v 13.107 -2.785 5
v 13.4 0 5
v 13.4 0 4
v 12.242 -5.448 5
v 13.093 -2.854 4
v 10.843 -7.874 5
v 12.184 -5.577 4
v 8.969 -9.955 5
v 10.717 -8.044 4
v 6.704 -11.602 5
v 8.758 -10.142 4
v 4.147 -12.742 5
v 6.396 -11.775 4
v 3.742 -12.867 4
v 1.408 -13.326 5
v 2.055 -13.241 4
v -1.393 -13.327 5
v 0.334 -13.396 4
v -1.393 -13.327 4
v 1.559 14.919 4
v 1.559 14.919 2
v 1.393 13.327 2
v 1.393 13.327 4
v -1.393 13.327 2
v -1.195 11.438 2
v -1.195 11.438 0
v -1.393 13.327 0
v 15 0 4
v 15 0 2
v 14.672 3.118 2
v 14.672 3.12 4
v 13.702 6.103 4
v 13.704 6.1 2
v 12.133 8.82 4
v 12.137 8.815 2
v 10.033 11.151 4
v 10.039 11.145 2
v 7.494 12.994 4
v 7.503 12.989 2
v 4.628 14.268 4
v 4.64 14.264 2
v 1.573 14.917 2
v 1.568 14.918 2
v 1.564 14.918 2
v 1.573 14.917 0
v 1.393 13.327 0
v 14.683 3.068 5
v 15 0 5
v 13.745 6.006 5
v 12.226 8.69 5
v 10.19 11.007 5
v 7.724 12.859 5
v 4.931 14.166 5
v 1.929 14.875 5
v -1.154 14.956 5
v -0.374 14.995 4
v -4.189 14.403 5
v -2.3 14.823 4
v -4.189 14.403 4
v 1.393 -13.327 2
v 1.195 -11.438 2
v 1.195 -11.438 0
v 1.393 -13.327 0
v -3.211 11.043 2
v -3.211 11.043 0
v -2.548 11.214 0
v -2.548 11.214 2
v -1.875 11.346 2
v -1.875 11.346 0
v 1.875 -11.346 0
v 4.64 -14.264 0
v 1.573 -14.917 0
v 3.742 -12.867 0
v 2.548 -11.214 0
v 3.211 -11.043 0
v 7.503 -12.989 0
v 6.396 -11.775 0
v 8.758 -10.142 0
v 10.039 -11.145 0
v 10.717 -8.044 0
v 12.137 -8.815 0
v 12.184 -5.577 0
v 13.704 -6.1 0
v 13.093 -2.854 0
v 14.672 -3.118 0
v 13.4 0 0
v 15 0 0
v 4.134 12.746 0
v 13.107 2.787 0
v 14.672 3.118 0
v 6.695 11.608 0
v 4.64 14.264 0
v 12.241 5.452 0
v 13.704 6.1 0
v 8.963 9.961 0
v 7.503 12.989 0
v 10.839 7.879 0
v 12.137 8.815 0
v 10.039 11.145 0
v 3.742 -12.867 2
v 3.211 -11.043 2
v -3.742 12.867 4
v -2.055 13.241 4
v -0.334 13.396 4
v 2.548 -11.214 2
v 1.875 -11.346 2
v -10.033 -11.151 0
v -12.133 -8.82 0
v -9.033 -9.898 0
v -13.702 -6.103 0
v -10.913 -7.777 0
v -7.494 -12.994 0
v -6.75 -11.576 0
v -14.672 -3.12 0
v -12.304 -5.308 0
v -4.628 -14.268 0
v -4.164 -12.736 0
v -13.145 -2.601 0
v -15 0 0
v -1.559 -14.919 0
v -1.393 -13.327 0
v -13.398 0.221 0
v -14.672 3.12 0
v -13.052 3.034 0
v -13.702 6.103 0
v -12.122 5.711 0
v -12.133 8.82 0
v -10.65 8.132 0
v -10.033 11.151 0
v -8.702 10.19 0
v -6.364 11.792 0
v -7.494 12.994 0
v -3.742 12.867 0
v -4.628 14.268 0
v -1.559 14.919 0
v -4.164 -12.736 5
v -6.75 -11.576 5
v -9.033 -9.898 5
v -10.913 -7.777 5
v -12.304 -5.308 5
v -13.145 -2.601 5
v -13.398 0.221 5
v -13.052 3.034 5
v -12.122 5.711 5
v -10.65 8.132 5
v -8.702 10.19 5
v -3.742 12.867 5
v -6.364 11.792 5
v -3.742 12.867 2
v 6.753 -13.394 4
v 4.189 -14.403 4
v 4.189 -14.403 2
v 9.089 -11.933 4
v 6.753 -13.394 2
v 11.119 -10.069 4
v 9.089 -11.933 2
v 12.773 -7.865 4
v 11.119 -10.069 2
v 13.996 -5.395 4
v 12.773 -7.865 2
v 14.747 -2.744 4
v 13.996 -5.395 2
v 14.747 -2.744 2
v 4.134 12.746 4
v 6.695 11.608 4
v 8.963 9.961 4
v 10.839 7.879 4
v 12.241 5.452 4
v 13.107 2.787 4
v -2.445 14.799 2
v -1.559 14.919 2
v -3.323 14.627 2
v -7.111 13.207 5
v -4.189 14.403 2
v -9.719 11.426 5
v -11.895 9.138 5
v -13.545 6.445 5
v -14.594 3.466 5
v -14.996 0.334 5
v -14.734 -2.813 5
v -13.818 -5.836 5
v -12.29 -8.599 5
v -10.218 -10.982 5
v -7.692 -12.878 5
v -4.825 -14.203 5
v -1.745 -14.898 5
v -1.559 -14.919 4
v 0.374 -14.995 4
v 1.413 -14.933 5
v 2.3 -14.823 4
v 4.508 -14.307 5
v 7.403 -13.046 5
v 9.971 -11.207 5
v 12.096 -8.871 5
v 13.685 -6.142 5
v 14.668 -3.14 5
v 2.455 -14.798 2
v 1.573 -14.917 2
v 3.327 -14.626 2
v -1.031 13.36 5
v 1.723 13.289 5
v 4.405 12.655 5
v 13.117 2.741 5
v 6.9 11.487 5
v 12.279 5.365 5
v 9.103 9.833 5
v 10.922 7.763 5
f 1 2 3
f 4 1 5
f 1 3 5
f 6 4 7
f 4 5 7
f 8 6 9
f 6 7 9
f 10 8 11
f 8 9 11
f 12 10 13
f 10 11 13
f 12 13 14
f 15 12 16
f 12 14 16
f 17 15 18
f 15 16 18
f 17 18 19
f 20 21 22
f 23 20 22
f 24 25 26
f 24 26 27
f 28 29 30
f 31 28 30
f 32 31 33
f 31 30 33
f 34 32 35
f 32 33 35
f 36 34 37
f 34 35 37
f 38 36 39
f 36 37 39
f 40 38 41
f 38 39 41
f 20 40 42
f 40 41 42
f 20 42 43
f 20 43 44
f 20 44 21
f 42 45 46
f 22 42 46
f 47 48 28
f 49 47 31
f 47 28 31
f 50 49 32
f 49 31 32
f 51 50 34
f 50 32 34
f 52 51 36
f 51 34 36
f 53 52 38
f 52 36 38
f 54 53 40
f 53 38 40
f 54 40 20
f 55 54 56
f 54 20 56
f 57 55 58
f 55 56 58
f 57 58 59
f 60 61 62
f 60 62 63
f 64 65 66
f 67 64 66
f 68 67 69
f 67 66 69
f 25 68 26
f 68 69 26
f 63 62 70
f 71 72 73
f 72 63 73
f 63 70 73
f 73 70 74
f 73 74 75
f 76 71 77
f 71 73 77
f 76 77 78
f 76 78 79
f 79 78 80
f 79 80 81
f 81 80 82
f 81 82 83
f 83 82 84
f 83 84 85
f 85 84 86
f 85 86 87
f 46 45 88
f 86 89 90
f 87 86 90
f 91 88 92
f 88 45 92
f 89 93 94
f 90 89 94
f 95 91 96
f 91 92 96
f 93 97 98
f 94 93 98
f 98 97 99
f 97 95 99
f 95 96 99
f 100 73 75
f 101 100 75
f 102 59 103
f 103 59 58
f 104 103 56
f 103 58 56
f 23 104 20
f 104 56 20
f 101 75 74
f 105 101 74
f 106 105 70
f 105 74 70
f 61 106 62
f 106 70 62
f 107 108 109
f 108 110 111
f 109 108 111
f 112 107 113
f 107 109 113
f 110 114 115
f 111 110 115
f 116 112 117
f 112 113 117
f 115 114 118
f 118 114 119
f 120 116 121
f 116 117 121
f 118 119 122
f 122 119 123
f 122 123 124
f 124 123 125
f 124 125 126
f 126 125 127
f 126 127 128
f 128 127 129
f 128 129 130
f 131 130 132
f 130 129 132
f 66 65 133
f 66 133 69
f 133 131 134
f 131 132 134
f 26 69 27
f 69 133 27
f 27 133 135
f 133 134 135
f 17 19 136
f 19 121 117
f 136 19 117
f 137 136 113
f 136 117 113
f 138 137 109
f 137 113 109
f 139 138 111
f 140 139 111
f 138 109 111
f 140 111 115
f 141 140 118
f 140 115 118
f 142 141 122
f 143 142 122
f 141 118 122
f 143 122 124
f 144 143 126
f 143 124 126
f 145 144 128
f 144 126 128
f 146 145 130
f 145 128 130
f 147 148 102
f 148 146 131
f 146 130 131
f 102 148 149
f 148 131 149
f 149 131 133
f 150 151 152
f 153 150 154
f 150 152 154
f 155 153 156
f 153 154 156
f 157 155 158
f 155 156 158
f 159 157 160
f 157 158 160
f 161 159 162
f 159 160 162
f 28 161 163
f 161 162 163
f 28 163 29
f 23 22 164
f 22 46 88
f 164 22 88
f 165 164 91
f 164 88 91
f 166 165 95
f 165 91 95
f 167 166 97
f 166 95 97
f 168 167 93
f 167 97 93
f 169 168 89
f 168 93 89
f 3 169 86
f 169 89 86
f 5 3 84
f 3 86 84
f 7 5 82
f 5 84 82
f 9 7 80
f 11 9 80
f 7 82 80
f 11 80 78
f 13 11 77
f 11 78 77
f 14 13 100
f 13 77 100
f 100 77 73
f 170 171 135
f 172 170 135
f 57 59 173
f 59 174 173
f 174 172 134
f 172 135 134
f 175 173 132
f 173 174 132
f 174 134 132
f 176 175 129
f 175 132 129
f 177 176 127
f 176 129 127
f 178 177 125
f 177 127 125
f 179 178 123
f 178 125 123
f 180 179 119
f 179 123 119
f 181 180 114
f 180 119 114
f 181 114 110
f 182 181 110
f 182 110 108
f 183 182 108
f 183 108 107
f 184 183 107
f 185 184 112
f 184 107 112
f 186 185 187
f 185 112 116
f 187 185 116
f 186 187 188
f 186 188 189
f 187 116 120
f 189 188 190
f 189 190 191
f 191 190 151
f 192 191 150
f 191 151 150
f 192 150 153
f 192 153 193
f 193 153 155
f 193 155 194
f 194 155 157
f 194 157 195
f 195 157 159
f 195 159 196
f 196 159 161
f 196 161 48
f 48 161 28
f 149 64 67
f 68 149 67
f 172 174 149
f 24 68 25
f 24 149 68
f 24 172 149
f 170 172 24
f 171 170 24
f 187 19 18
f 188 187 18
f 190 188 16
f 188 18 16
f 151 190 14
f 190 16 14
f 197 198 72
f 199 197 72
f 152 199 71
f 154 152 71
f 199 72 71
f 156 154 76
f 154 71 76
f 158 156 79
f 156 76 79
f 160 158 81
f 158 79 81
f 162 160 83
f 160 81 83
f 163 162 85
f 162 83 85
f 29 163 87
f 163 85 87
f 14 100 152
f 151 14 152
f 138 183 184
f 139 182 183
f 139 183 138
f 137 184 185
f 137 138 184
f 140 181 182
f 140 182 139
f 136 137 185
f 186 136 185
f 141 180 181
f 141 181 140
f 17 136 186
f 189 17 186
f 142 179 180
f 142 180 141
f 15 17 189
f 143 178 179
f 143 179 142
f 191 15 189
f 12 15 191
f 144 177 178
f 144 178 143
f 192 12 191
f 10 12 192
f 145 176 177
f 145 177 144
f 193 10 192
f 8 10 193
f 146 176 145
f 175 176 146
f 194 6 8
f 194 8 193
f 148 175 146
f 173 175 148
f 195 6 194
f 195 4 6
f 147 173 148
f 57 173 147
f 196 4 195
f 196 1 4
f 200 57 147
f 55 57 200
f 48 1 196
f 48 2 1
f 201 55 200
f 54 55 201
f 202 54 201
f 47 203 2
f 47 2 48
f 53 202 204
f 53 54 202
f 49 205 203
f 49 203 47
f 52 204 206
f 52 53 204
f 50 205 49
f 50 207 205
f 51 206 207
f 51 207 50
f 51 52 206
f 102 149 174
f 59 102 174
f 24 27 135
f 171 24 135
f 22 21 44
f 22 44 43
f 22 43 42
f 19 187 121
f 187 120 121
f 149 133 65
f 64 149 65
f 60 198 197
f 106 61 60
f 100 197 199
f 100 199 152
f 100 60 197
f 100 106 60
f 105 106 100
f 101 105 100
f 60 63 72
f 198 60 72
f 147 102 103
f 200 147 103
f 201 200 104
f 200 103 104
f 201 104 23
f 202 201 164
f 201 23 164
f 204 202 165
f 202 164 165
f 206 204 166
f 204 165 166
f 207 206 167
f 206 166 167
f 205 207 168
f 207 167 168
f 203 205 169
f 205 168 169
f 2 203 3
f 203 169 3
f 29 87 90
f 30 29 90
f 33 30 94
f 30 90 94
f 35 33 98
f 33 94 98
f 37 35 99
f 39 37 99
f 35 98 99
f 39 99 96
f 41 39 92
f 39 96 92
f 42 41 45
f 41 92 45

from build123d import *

# Parameters (mm, degrees)
F1_DEPTH = 2
F3_DEPTH = 2
F5_DEPTH = 1


with BuildPart() as f1:
    # F0 (on Top) → F1 (new body)
    with BuildSketch(Plane.XY):
        with BuildLine():
            Line((-1.1952485209, 11.4377174722), (-1.3927243635, 13.3274273154))
            ThreePointArc((-1.3927243635, 13.3274273154), (-2.5775676265, 13.1497583678), (-3.7418055675, 12.8669689941))
            Line((-3.7418055675, 12.8669689941), (-3.2112510467, 11.0425480173))
            ThreePointArc((-3.2112510467, 11.0425480173), (-2.2120916198, 11.2852403902), (-1.1952485209, 11.4377174722))
        make_face()
        with BuildLine():
            Line((-1.3927243635, 13.3274273154), (-1.5590198098, 14.9187619202))
            ThreePointArc((-1.5590198098, 14.9187619202), (-15, 0), (-1.5590198098, -14.9187619202))
            Line((-1.5590198098, -14.9187619202), (-1.3927243635, -13.3274273154))
            ThreePointArc((-1.3927243635, -13.3274273154), (-13.3464395592, -1.1968922642), (-3.7418055675, 12.8669689941))
            ThreePointArc((-3.7418055675, 12.8669689941), (-2.5775676265, 13.1497583678), (-1.3927243635, 13.3274273154))
        make_face()
    extrude(amount=F1_DEPTH)

    # F2 (on face) → F3, piece 2 (join)
    with BuildSketch(Plane.XY.offset(2)):
        with BuildLine():
            ThreePointArc((-4.1885883218, 14.4033235009), (-14.9400442827, -1.3398047734), (-1.5590198098, -14.9187619202))
            Line((-1.5590198098, -14.9187619202), (-1.3927243635, -13.3274273154))
            ThreePointArc((-1.3927243635, -13.3274273154), (-13.3464395592, -1.1968922642), (-3.7418055675, 12.8669689941))
            Line((-3.7418055675, 12.8669689941), (-4.1885883218, 14.4033235009))
        make_face()
    extrude(amount=F3_DEPTH)



with BuildPart() as f1b:
    # F0 (on Top) → F1, piece 2 (new body)
    with BuildSketch(Plane.XY):
        with BuildLine():
            ThreePointArc((1.5731137528, -14.9172823638), (11.1489171289, -10.0350210191), (15, 0))
            ThreePointArc((15, 0), (11.1489171289, 10.0350210191), (1.5731137528, 14.9172823638))
            Line((1.5731137528, 14.9172823638), (1.3927243635, 13.3274273154))
            ThreePointArc((1.3927243635, 13.3274273154), (9.9554634867, 8.9693225366), (13.4, 0))
            ThreePointArc((13.4, 0), (10.7168137663, -8.0442465587), (3.7418055675, -12.8669689941))
            ThreePointArc((3.7418055675, -12.8669689941), (2.5775676265, -13.1497583678), (1.3927243635, -13.3274273154))
            Line((1.3927243635, -13.3274273154), (1.5731137528, -14.9172823638))
        make_face()
        with BuildLine():
            Line((1.1952485209, -11.4377174722), (1.3927243635, -13.3274273154))
            ThreePointArc((1.3927243635, -13.3274273154), (2.5775676265, -13.1497583678), (3.7418055675, -12.8669689941))
            Line((3.7418055675, -12.8669689941), (3.2112510467, -11.0425480173))
            ThreePointArc((3.2112510467, -11.0425480173), (2.2120916198, -11.2852403902), (1.1952485209, -11.4377174722))
        make_face()
    extrude(amount=F1_DEPTH)

    # F2 (on face) → F3 (join)
    with BuildSketch(Plane.XY.offset(2)):
        with BuildLine():
            ThreePointArc((4.1885883218, -14.4033235009), (11.9964333205, -9.0047536105), (15, 0))
            ThreePointArc((15, 0), (11.1441755448, 10.0402864215), (1.5590198098, 14.9187619202))
            Line((1.5590198098, 14.9187619202), (1.3927243635, 13.3274273154))
            ThreePointArc((1.3927243635, 13.3274273154), (9.9554634867, 8.9693225366), (13.4, 0))
            ThreePointArc((13.4, 0), (10.7168137663, -8.0442465587), (3.7418055675, -12.8669689941))
            Line((3.7418055675, -12.8669689941), (4.1885883218, -14.4033235009))
        make_face()
    extrude(amount=F3_DEPTH)


with BuildPart() as f1_1:
    add(f1.part)

    add(f1b.part)  # F5 merges F1b
    # F4 (on face) → F5 (join)
    with BuildSketch(Plane.XY.offset(4)):
        with BuildLine():
            Line((-3.7418055675, 12.8669689941), (-4.1885883218, 14.4033235009))
            ThreePointArc((-4.1885883218, 14.4033235009), (-14.9400442827, -1.3398047734), (-1.5590198098, -14.9187619202))
            Line((-1.5590198098, -14.9187619202), (-1.3927243635, -13.3274273154))
            ThreePointArc((-1.3927243635, -13.3274273154), (-13.3464395592, -1.1968922642), (-3.7418055675, 12.8669689941))
        make_face()
        with BuildLine():
            ThreePointArc((-1.5590198098, -14.9187619202), (10.0402864215, -11.1441755448), (15, 0))
            ThreePointArc((15, 0), (9.0047536105, 11.9964333205), (-4.1885883218, 14.4033235009))
            Line((-4.1885883218, 14.4033235009), (-3.7418055675, 12.8669689941))
            ThreePointArc((-3.7418055675, 12.8669689941), (8.0442465587, 10.7168137663), (13.4, 0))
            ThreePointArc((13.4, 0), (8.9693225366, -9.9554634867), (-1.3927243635, -13.3274273154))
            Line((-1.3927243635, -13.3274273154), (-1.5590198098, -14.9187619202))
        make_face()
    extrude(amount=F5_DEPTH)


solid = f1_1.part
